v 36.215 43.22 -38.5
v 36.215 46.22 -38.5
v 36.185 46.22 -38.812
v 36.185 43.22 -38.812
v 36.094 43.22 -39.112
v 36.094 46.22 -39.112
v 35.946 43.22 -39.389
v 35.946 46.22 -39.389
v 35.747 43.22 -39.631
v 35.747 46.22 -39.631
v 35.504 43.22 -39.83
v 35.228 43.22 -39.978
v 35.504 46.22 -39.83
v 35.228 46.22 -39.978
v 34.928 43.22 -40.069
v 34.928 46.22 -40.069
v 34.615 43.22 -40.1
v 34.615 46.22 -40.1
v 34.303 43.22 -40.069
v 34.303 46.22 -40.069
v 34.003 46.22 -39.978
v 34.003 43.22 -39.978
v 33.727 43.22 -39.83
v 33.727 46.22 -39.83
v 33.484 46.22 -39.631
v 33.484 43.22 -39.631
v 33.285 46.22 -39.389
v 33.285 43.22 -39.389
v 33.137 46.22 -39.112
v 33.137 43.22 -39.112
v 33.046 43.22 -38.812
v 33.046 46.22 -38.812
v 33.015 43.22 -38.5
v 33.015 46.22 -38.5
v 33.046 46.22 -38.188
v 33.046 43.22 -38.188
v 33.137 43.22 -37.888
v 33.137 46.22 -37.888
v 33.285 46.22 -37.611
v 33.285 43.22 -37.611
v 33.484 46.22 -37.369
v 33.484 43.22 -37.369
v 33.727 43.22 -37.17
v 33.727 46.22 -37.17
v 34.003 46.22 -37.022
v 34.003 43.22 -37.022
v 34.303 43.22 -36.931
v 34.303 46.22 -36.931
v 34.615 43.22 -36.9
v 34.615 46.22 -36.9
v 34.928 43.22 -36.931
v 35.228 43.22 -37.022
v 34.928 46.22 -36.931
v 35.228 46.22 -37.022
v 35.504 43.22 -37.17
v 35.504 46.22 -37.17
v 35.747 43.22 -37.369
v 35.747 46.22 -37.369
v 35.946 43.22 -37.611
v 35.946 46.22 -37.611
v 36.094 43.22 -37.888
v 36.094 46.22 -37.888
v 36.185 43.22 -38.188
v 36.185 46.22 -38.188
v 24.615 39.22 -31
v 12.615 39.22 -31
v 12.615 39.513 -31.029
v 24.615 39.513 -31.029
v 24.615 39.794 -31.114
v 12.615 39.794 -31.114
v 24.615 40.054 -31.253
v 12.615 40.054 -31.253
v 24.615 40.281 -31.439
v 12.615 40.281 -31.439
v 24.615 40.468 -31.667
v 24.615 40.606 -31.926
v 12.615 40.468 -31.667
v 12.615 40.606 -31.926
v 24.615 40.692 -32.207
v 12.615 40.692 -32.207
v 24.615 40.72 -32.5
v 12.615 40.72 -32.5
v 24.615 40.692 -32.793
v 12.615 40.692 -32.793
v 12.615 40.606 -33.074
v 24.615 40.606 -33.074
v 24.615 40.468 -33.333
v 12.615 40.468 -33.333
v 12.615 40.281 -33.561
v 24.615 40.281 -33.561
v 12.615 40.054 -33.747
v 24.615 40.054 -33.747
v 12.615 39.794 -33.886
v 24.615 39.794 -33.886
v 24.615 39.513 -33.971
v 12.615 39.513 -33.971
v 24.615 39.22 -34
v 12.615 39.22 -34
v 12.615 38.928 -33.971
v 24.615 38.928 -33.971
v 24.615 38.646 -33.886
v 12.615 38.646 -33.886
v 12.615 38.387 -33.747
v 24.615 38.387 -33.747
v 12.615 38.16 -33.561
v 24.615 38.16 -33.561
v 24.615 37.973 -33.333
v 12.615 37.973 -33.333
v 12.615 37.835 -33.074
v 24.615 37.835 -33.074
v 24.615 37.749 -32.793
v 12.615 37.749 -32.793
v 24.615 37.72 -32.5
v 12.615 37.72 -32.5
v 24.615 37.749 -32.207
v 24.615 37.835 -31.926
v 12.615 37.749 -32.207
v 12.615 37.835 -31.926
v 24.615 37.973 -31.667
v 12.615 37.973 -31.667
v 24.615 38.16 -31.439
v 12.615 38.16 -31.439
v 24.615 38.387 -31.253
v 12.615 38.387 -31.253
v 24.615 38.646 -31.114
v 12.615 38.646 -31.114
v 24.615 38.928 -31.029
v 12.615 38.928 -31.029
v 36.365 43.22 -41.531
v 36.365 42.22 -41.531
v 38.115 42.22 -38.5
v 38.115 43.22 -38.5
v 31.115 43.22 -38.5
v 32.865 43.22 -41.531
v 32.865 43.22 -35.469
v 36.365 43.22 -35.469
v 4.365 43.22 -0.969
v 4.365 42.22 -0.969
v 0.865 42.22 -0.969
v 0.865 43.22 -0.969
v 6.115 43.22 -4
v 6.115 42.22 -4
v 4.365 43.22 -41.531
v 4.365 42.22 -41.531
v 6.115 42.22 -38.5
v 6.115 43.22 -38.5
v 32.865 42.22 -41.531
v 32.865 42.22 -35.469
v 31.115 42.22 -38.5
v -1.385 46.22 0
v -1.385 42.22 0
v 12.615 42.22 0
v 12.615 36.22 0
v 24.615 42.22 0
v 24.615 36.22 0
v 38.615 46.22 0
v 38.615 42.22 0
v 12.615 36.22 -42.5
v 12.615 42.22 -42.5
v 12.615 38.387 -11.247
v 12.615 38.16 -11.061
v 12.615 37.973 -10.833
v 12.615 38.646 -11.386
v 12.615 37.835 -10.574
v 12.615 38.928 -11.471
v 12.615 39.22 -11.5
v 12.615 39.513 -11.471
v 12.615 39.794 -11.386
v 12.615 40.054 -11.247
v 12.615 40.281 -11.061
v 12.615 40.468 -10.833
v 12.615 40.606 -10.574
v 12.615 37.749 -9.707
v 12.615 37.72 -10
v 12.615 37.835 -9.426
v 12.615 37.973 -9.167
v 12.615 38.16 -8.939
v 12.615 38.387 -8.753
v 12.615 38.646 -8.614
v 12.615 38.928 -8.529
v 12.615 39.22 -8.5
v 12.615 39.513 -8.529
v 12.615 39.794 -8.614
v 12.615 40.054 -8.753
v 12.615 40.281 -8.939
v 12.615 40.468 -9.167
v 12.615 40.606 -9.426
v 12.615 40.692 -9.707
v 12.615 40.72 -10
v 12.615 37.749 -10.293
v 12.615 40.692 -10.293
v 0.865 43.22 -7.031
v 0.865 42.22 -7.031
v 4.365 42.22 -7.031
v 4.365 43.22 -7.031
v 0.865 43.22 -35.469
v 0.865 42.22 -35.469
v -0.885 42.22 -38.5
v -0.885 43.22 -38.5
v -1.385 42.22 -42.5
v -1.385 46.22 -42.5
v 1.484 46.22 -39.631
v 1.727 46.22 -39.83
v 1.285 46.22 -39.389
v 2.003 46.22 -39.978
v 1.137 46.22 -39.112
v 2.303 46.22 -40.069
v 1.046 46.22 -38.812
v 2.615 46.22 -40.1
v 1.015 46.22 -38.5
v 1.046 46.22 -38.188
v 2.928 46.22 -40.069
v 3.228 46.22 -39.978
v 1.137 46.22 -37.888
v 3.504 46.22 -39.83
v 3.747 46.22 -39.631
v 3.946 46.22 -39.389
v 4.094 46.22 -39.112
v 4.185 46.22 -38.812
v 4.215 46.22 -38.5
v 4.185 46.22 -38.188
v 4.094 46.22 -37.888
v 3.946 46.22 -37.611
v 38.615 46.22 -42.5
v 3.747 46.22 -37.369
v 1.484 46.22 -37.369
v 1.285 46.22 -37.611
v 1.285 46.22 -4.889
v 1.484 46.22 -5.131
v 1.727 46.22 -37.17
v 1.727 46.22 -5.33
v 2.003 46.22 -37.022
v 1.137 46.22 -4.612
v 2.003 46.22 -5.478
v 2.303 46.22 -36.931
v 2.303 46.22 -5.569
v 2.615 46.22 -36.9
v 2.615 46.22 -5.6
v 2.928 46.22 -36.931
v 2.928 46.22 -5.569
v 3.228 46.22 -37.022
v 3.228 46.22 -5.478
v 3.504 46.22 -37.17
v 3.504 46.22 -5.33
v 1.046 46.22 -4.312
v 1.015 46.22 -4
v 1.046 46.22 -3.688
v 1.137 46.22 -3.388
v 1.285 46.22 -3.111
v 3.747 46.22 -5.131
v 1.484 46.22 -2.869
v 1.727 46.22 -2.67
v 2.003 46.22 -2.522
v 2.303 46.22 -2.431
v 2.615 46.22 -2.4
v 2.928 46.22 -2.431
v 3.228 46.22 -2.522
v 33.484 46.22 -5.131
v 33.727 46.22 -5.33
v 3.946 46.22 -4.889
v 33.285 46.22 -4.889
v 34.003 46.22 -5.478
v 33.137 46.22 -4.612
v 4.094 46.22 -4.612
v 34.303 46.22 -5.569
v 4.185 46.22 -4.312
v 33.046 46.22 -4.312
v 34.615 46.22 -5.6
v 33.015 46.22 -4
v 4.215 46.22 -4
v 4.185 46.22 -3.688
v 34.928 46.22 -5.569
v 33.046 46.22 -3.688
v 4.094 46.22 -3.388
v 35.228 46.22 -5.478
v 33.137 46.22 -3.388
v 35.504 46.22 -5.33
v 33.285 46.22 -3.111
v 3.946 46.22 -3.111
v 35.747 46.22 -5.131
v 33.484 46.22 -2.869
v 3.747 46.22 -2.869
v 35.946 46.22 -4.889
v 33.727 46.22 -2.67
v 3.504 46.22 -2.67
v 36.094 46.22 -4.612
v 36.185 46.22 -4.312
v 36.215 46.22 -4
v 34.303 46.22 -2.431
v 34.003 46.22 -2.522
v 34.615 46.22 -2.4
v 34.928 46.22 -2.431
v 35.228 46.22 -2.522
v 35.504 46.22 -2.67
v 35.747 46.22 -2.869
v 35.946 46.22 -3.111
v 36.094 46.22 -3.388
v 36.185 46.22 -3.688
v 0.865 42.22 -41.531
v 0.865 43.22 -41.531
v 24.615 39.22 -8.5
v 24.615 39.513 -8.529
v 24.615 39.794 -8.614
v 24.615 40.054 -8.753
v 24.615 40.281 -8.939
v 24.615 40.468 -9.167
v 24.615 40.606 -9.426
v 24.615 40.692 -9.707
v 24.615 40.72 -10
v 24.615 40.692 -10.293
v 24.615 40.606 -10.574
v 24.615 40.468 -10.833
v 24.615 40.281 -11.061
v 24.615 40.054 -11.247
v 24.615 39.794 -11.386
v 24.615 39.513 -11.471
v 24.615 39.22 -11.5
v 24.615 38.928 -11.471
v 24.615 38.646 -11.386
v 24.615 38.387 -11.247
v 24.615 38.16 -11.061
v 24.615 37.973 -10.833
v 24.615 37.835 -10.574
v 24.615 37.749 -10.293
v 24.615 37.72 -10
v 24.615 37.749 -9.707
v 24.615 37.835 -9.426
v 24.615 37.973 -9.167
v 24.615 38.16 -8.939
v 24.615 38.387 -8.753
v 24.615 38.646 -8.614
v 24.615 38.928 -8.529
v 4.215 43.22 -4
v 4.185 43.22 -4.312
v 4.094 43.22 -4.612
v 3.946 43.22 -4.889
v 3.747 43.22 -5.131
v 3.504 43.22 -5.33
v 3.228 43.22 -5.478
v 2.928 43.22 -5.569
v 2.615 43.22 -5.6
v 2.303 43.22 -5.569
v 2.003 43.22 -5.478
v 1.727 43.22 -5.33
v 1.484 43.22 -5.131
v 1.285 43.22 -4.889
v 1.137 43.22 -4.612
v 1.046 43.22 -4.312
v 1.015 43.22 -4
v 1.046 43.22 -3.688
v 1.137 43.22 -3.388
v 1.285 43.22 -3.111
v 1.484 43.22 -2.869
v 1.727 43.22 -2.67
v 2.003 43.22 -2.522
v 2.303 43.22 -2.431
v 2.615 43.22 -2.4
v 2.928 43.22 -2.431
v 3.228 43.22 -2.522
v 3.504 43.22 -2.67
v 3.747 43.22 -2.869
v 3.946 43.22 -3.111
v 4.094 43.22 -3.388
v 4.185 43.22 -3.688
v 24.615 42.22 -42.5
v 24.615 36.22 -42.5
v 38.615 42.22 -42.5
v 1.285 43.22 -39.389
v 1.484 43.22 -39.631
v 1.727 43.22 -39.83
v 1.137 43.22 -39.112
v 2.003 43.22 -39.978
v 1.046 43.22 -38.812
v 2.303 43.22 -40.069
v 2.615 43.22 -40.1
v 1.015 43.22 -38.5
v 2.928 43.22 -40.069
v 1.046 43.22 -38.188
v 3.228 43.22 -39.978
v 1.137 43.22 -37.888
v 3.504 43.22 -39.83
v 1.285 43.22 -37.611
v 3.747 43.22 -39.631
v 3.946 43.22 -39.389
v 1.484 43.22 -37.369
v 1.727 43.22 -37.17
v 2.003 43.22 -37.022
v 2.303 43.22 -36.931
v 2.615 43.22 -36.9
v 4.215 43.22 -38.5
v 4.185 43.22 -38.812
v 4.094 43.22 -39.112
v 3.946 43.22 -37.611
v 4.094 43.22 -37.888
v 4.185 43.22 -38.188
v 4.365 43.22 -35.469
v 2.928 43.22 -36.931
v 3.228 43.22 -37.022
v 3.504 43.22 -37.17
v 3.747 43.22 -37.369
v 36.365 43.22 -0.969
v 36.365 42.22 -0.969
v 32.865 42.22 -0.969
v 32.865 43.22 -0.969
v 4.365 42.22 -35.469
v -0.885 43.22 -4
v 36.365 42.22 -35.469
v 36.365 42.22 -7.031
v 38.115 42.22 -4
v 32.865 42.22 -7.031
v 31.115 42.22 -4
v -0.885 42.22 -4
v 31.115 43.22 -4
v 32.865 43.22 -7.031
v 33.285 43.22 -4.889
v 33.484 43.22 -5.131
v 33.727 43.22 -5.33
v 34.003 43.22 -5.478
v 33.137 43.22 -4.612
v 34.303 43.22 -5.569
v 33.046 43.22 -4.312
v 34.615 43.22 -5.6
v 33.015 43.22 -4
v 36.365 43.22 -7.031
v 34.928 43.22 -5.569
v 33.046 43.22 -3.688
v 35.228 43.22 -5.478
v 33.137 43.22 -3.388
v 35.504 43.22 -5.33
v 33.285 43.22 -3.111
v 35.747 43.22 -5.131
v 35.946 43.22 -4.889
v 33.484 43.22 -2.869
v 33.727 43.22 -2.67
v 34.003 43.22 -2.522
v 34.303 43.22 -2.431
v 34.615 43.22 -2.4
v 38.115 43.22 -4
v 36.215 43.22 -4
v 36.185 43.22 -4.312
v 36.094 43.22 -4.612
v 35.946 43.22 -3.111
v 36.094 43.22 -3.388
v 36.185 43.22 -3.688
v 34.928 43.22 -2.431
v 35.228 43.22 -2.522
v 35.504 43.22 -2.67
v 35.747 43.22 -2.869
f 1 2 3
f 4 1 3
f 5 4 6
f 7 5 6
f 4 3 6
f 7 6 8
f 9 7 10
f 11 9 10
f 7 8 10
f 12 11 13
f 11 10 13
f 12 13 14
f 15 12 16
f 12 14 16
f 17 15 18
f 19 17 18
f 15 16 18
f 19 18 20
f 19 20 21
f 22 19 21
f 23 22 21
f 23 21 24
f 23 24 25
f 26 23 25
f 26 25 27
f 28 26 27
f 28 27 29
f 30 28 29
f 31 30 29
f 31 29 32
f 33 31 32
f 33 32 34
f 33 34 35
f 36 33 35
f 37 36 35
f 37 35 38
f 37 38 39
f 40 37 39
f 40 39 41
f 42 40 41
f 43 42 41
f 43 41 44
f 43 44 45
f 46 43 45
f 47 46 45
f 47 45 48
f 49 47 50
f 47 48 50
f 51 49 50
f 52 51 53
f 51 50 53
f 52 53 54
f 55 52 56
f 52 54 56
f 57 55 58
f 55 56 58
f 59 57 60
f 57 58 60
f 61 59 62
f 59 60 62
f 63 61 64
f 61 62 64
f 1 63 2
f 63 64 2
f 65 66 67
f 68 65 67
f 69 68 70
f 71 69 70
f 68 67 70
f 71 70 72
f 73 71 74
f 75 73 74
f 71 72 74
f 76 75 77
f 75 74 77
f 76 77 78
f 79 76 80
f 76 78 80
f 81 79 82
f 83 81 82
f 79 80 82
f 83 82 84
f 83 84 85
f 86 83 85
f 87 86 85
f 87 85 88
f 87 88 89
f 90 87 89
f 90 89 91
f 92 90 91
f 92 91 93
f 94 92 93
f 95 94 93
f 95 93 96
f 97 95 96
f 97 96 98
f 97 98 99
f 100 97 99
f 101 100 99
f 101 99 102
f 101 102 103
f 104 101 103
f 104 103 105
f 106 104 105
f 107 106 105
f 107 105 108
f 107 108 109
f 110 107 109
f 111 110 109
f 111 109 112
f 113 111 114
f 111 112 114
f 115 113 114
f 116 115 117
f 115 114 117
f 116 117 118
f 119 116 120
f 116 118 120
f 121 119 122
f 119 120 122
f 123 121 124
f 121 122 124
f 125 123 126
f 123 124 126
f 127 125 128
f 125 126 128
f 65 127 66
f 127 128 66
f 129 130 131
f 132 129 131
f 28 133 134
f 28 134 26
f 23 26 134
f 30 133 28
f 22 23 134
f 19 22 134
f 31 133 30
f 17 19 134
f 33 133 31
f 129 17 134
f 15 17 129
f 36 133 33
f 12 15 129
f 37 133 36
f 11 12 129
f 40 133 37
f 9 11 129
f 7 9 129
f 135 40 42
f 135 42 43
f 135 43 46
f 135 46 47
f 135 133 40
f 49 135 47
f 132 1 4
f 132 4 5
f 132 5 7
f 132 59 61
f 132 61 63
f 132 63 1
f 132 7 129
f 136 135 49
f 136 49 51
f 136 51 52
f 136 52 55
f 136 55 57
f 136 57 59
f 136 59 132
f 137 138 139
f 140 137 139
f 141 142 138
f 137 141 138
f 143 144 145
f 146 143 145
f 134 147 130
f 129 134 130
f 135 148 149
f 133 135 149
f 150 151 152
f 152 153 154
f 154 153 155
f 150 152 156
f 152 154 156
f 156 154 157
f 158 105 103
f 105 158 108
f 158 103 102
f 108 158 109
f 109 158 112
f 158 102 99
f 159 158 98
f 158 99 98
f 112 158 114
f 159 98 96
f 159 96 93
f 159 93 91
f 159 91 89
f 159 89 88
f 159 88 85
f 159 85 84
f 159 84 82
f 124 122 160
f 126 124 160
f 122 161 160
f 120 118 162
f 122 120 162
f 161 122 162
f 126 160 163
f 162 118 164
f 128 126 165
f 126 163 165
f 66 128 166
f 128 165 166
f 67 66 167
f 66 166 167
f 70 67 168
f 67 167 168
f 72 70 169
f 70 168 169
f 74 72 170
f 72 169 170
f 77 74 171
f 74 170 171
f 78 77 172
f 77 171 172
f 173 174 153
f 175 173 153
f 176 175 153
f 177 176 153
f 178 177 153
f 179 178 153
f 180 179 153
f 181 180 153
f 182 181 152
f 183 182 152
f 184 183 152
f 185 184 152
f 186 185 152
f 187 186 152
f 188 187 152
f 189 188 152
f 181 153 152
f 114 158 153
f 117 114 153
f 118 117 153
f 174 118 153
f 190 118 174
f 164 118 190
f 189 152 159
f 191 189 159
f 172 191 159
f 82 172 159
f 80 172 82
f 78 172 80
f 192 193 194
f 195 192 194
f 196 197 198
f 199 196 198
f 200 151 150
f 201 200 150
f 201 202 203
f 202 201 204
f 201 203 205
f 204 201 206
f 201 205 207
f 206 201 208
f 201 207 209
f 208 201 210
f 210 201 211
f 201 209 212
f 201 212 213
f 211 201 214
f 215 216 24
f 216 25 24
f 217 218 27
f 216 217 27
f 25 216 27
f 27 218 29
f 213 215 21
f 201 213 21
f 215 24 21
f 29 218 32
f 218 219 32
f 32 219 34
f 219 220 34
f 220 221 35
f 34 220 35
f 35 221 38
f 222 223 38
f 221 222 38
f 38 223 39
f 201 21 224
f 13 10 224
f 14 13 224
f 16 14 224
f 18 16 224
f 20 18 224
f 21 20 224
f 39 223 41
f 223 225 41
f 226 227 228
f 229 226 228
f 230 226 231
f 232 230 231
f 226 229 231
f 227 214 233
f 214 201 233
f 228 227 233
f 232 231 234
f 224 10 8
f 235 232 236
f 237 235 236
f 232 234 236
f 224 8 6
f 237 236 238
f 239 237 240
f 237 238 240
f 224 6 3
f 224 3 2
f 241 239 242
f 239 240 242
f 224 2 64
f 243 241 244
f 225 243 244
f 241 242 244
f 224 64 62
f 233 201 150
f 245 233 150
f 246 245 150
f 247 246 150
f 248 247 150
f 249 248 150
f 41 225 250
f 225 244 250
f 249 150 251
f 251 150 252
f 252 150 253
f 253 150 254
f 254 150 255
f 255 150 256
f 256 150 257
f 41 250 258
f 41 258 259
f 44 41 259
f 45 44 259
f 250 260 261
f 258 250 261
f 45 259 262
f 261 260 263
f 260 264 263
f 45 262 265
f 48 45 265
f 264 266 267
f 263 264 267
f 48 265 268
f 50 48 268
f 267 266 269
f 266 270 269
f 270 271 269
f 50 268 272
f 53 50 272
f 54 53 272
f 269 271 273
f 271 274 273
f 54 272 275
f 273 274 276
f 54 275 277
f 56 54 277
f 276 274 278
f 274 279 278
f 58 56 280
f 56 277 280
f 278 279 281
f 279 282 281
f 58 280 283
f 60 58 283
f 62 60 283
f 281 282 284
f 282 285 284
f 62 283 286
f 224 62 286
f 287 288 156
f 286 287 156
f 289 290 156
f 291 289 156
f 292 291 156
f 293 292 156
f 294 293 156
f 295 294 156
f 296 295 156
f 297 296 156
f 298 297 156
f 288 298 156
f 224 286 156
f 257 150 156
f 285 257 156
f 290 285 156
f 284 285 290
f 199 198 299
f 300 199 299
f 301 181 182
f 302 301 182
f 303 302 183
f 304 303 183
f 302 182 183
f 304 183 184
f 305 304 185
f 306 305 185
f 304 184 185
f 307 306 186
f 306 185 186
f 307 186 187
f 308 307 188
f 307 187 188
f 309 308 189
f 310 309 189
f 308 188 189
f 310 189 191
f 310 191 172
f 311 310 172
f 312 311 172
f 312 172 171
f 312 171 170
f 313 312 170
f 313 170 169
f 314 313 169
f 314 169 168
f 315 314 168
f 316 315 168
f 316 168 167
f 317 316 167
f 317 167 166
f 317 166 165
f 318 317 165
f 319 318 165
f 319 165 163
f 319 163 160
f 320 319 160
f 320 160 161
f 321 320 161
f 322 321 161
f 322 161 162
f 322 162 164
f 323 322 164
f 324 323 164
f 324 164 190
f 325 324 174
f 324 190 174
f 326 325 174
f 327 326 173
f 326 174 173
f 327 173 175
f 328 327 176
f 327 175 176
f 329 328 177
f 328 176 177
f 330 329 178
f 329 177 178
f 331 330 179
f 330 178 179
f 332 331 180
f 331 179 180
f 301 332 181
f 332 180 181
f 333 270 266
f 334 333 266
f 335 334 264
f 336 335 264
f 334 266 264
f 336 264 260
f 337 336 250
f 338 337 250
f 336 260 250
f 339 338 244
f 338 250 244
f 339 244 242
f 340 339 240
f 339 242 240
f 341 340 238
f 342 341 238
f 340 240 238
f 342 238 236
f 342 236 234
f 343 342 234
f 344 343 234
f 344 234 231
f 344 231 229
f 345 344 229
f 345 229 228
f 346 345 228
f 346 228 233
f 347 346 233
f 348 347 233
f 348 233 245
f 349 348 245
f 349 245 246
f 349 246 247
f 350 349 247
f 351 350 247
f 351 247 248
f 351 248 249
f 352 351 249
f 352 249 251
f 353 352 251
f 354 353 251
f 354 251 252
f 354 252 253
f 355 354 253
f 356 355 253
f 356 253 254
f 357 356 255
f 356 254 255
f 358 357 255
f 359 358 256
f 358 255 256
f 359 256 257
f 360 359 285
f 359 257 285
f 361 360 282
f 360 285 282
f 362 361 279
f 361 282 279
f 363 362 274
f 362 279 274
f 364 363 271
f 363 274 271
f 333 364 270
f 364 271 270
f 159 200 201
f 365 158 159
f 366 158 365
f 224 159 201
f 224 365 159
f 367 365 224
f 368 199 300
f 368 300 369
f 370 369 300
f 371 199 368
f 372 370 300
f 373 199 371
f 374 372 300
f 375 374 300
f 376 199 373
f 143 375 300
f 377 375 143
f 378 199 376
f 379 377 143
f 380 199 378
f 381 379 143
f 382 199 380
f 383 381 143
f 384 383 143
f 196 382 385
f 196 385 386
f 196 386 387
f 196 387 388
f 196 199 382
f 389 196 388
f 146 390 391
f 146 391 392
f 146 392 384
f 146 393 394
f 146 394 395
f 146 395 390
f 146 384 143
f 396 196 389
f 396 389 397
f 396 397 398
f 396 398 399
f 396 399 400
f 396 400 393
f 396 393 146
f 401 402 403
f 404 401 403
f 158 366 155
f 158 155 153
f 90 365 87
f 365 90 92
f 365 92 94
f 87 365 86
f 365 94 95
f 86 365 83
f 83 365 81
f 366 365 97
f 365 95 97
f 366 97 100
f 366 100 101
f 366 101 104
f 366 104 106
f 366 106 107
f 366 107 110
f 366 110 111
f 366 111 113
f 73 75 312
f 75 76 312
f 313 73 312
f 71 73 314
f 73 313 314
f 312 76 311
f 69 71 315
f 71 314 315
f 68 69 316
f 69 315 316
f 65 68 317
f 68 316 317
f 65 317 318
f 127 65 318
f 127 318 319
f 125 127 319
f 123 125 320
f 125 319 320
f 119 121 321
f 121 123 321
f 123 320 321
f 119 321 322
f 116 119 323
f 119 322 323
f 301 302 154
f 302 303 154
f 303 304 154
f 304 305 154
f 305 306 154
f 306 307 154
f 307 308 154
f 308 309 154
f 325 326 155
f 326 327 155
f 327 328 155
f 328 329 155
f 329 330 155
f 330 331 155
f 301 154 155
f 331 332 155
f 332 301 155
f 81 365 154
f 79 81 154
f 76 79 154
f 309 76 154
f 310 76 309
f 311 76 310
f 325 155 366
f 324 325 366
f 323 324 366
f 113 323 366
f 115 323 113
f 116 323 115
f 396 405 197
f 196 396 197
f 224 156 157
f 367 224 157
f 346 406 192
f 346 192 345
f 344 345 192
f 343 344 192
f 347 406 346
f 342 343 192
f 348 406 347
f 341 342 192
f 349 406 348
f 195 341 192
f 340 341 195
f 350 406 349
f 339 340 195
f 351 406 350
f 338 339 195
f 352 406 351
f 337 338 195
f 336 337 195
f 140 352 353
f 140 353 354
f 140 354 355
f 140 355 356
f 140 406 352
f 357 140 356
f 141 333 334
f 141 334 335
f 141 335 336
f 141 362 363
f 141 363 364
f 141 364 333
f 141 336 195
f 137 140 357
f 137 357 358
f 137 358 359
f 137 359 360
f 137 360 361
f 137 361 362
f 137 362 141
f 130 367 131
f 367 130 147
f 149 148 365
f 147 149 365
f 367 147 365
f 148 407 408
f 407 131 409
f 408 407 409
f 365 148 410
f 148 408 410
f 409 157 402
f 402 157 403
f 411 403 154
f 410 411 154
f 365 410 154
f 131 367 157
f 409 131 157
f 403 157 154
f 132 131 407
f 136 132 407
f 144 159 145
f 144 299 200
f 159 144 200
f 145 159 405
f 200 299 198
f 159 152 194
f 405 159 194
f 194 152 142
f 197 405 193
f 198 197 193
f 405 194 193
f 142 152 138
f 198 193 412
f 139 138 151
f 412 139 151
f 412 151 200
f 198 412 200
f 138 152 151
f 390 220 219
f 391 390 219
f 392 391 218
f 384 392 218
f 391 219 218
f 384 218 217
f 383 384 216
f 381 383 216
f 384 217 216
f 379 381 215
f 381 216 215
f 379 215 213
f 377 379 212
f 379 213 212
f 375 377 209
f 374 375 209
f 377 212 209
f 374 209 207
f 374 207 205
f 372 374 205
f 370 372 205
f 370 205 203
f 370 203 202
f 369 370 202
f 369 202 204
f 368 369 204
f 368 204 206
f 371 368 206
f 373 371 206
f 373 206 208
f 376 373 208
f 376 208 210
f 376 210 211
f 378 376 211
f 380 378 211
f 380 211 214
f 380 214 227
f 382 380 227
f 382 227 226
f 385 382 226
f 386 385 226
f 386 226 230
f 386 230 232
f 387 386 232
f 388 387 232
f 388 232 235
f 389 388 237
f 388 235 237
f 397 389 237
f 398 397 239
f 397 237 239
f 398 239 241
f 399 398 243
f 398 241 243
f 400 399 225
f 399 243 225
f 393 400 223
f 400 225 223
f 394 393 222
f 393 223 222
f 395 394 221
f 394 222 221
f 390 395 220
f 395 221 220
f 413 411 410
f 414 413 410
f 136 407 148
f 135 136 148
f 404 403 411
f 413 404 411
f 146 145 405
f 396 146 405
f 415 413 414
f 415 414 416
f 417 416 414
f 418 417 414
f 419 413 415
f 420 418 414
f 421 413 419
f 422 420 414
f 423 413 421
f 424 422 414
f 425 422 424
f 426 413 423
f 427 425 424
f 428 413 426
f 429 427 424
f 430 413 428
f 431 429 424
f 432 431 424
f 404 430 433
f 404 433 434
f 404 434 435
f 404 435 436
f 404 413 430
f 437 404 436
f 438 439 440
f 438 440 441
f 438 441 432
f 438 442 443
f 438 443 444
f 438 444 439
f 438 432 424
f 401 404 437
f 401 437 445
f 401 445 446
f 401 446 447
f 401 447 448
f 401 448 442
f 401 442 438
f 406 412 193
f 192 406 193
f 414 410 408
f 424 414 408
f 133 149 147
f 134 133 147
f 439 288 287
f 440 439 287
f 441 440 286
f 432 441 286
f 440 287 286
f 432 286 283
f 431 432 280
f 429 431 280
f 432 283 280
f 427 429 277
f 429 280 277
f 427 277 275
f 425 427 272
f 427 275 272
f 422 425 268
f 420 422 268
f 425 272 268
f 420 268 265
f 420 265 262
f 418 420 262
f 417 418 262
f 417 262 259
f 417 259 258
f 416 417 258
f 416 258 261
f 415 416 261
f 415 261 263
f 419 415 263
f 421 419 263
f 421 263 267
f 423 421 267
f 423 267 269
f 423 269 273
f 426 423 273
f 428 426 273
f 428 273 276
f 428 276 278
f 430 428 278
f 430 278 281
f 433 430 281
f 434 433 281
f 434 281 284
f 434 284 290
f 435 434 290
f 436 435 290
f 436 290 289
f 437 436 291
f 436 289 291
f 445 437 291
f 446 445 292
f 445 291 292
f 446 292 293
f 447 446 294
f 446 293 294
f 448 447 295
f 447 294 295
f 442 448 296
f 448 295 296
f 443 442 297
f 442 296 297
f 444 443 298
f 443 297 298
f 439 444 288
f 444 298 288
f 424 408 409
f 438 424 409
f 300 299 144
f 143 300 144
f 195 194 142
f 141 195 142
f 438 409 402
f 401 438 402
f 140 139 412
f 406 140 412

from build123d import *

# Parameters (mm, degrees)
BOSS_EXTRU_1_DEPTH      = 42.5
D_GAGEMENT_M31_D        = 3
D_GAGEMENT_M33_D        = 3.2
ENL_V_MAT_EXTRU_1_DEPTH = 1


with BuildPart() as part:
    # Esquisse1 → Boss.-Extru.1 (new body)
    with BuildSketch(Plane(origin=(0, 0, 0), x_dir=(1, 0, 0), z_dir=(0, 0, -1))):
        Polygon((-1.384510159, -46.220398701), (38.615489841, -46.220398701), (38.615489841, -42.220398701), (24.615489841, -42.220398701), (24.615489841, -36.220398701), (12.615489841, -36.220398701), (12.615489841, -42.220398701), (-1.384510159, -42.220398701), align=None)
    extrude(amount=BOSS_EXTRU_1_DEPTH)

    # Dégagement M31 (through all)
    with Locations(Plane(origin=(24.615489841, 0, 0), x_dir=(0, 0, -1), z_dir=(1, 0, 0))):
        with Locations((10, 39.220398701), (32.5, 39.220398701)):
            Hole(D_GAGEMENT_M31_D / 2)

    # Dégagement M33 (through all)
    with Locations(Plane(origin=(0, 42.220398701, 0), x_dir=(-1, 0, 0), z_dir=(0, -1, 0))):
        with Locations((3, -59.94627318), (-34.615489841, 38.5), (-2.615489841, 38.5), (-2.615489841, 4), (-34.615489841, 4)):
            Hole(D_GAGEMENT_M33_D / 2)

    # Esquisse9 → Enlèv. mat.-Extru.1 (cut)
    with BuildSketch(Plane.XZ.offset(-42.220398701)):
        Polygon((32.865489841, -35.468911087), (31.115489841, -38.5), (32.865489841, -41.531088913), (36.365489841, -41.531088913), (38.115489841, -38.5), (36.365489841, -35.468911087), align=None)
        Polygon((4.365489841, -35.468911087), (0.865489841, -35.468911087), (-0.884510159, -38.5), (0.865489841, -41.531088913), (4.365489841, -41.531088913), (6.115489841, -38.5), align=None)
        Polygon((32.865489841, -0.968911087), (31.115489841, -4), (32.865489841, -7.031088913), (36.365489841, -7.031088913), (38.115489841, -4), (36.365489841, -0.968911087), align=None)
        Polygon((4.365489841, -0.968911087), (0.865489841, -0.968911087), (-0.884510159, -4), (0.865489841, -7.031088913), (4.365489841, -7.031088913), (6.115489841, -4), align=None)
    extrude(amount=-ENL_V_MAT_EXTRU_1_DEPTH, mode=Mode.SUBTRACT)


solid = part.part
